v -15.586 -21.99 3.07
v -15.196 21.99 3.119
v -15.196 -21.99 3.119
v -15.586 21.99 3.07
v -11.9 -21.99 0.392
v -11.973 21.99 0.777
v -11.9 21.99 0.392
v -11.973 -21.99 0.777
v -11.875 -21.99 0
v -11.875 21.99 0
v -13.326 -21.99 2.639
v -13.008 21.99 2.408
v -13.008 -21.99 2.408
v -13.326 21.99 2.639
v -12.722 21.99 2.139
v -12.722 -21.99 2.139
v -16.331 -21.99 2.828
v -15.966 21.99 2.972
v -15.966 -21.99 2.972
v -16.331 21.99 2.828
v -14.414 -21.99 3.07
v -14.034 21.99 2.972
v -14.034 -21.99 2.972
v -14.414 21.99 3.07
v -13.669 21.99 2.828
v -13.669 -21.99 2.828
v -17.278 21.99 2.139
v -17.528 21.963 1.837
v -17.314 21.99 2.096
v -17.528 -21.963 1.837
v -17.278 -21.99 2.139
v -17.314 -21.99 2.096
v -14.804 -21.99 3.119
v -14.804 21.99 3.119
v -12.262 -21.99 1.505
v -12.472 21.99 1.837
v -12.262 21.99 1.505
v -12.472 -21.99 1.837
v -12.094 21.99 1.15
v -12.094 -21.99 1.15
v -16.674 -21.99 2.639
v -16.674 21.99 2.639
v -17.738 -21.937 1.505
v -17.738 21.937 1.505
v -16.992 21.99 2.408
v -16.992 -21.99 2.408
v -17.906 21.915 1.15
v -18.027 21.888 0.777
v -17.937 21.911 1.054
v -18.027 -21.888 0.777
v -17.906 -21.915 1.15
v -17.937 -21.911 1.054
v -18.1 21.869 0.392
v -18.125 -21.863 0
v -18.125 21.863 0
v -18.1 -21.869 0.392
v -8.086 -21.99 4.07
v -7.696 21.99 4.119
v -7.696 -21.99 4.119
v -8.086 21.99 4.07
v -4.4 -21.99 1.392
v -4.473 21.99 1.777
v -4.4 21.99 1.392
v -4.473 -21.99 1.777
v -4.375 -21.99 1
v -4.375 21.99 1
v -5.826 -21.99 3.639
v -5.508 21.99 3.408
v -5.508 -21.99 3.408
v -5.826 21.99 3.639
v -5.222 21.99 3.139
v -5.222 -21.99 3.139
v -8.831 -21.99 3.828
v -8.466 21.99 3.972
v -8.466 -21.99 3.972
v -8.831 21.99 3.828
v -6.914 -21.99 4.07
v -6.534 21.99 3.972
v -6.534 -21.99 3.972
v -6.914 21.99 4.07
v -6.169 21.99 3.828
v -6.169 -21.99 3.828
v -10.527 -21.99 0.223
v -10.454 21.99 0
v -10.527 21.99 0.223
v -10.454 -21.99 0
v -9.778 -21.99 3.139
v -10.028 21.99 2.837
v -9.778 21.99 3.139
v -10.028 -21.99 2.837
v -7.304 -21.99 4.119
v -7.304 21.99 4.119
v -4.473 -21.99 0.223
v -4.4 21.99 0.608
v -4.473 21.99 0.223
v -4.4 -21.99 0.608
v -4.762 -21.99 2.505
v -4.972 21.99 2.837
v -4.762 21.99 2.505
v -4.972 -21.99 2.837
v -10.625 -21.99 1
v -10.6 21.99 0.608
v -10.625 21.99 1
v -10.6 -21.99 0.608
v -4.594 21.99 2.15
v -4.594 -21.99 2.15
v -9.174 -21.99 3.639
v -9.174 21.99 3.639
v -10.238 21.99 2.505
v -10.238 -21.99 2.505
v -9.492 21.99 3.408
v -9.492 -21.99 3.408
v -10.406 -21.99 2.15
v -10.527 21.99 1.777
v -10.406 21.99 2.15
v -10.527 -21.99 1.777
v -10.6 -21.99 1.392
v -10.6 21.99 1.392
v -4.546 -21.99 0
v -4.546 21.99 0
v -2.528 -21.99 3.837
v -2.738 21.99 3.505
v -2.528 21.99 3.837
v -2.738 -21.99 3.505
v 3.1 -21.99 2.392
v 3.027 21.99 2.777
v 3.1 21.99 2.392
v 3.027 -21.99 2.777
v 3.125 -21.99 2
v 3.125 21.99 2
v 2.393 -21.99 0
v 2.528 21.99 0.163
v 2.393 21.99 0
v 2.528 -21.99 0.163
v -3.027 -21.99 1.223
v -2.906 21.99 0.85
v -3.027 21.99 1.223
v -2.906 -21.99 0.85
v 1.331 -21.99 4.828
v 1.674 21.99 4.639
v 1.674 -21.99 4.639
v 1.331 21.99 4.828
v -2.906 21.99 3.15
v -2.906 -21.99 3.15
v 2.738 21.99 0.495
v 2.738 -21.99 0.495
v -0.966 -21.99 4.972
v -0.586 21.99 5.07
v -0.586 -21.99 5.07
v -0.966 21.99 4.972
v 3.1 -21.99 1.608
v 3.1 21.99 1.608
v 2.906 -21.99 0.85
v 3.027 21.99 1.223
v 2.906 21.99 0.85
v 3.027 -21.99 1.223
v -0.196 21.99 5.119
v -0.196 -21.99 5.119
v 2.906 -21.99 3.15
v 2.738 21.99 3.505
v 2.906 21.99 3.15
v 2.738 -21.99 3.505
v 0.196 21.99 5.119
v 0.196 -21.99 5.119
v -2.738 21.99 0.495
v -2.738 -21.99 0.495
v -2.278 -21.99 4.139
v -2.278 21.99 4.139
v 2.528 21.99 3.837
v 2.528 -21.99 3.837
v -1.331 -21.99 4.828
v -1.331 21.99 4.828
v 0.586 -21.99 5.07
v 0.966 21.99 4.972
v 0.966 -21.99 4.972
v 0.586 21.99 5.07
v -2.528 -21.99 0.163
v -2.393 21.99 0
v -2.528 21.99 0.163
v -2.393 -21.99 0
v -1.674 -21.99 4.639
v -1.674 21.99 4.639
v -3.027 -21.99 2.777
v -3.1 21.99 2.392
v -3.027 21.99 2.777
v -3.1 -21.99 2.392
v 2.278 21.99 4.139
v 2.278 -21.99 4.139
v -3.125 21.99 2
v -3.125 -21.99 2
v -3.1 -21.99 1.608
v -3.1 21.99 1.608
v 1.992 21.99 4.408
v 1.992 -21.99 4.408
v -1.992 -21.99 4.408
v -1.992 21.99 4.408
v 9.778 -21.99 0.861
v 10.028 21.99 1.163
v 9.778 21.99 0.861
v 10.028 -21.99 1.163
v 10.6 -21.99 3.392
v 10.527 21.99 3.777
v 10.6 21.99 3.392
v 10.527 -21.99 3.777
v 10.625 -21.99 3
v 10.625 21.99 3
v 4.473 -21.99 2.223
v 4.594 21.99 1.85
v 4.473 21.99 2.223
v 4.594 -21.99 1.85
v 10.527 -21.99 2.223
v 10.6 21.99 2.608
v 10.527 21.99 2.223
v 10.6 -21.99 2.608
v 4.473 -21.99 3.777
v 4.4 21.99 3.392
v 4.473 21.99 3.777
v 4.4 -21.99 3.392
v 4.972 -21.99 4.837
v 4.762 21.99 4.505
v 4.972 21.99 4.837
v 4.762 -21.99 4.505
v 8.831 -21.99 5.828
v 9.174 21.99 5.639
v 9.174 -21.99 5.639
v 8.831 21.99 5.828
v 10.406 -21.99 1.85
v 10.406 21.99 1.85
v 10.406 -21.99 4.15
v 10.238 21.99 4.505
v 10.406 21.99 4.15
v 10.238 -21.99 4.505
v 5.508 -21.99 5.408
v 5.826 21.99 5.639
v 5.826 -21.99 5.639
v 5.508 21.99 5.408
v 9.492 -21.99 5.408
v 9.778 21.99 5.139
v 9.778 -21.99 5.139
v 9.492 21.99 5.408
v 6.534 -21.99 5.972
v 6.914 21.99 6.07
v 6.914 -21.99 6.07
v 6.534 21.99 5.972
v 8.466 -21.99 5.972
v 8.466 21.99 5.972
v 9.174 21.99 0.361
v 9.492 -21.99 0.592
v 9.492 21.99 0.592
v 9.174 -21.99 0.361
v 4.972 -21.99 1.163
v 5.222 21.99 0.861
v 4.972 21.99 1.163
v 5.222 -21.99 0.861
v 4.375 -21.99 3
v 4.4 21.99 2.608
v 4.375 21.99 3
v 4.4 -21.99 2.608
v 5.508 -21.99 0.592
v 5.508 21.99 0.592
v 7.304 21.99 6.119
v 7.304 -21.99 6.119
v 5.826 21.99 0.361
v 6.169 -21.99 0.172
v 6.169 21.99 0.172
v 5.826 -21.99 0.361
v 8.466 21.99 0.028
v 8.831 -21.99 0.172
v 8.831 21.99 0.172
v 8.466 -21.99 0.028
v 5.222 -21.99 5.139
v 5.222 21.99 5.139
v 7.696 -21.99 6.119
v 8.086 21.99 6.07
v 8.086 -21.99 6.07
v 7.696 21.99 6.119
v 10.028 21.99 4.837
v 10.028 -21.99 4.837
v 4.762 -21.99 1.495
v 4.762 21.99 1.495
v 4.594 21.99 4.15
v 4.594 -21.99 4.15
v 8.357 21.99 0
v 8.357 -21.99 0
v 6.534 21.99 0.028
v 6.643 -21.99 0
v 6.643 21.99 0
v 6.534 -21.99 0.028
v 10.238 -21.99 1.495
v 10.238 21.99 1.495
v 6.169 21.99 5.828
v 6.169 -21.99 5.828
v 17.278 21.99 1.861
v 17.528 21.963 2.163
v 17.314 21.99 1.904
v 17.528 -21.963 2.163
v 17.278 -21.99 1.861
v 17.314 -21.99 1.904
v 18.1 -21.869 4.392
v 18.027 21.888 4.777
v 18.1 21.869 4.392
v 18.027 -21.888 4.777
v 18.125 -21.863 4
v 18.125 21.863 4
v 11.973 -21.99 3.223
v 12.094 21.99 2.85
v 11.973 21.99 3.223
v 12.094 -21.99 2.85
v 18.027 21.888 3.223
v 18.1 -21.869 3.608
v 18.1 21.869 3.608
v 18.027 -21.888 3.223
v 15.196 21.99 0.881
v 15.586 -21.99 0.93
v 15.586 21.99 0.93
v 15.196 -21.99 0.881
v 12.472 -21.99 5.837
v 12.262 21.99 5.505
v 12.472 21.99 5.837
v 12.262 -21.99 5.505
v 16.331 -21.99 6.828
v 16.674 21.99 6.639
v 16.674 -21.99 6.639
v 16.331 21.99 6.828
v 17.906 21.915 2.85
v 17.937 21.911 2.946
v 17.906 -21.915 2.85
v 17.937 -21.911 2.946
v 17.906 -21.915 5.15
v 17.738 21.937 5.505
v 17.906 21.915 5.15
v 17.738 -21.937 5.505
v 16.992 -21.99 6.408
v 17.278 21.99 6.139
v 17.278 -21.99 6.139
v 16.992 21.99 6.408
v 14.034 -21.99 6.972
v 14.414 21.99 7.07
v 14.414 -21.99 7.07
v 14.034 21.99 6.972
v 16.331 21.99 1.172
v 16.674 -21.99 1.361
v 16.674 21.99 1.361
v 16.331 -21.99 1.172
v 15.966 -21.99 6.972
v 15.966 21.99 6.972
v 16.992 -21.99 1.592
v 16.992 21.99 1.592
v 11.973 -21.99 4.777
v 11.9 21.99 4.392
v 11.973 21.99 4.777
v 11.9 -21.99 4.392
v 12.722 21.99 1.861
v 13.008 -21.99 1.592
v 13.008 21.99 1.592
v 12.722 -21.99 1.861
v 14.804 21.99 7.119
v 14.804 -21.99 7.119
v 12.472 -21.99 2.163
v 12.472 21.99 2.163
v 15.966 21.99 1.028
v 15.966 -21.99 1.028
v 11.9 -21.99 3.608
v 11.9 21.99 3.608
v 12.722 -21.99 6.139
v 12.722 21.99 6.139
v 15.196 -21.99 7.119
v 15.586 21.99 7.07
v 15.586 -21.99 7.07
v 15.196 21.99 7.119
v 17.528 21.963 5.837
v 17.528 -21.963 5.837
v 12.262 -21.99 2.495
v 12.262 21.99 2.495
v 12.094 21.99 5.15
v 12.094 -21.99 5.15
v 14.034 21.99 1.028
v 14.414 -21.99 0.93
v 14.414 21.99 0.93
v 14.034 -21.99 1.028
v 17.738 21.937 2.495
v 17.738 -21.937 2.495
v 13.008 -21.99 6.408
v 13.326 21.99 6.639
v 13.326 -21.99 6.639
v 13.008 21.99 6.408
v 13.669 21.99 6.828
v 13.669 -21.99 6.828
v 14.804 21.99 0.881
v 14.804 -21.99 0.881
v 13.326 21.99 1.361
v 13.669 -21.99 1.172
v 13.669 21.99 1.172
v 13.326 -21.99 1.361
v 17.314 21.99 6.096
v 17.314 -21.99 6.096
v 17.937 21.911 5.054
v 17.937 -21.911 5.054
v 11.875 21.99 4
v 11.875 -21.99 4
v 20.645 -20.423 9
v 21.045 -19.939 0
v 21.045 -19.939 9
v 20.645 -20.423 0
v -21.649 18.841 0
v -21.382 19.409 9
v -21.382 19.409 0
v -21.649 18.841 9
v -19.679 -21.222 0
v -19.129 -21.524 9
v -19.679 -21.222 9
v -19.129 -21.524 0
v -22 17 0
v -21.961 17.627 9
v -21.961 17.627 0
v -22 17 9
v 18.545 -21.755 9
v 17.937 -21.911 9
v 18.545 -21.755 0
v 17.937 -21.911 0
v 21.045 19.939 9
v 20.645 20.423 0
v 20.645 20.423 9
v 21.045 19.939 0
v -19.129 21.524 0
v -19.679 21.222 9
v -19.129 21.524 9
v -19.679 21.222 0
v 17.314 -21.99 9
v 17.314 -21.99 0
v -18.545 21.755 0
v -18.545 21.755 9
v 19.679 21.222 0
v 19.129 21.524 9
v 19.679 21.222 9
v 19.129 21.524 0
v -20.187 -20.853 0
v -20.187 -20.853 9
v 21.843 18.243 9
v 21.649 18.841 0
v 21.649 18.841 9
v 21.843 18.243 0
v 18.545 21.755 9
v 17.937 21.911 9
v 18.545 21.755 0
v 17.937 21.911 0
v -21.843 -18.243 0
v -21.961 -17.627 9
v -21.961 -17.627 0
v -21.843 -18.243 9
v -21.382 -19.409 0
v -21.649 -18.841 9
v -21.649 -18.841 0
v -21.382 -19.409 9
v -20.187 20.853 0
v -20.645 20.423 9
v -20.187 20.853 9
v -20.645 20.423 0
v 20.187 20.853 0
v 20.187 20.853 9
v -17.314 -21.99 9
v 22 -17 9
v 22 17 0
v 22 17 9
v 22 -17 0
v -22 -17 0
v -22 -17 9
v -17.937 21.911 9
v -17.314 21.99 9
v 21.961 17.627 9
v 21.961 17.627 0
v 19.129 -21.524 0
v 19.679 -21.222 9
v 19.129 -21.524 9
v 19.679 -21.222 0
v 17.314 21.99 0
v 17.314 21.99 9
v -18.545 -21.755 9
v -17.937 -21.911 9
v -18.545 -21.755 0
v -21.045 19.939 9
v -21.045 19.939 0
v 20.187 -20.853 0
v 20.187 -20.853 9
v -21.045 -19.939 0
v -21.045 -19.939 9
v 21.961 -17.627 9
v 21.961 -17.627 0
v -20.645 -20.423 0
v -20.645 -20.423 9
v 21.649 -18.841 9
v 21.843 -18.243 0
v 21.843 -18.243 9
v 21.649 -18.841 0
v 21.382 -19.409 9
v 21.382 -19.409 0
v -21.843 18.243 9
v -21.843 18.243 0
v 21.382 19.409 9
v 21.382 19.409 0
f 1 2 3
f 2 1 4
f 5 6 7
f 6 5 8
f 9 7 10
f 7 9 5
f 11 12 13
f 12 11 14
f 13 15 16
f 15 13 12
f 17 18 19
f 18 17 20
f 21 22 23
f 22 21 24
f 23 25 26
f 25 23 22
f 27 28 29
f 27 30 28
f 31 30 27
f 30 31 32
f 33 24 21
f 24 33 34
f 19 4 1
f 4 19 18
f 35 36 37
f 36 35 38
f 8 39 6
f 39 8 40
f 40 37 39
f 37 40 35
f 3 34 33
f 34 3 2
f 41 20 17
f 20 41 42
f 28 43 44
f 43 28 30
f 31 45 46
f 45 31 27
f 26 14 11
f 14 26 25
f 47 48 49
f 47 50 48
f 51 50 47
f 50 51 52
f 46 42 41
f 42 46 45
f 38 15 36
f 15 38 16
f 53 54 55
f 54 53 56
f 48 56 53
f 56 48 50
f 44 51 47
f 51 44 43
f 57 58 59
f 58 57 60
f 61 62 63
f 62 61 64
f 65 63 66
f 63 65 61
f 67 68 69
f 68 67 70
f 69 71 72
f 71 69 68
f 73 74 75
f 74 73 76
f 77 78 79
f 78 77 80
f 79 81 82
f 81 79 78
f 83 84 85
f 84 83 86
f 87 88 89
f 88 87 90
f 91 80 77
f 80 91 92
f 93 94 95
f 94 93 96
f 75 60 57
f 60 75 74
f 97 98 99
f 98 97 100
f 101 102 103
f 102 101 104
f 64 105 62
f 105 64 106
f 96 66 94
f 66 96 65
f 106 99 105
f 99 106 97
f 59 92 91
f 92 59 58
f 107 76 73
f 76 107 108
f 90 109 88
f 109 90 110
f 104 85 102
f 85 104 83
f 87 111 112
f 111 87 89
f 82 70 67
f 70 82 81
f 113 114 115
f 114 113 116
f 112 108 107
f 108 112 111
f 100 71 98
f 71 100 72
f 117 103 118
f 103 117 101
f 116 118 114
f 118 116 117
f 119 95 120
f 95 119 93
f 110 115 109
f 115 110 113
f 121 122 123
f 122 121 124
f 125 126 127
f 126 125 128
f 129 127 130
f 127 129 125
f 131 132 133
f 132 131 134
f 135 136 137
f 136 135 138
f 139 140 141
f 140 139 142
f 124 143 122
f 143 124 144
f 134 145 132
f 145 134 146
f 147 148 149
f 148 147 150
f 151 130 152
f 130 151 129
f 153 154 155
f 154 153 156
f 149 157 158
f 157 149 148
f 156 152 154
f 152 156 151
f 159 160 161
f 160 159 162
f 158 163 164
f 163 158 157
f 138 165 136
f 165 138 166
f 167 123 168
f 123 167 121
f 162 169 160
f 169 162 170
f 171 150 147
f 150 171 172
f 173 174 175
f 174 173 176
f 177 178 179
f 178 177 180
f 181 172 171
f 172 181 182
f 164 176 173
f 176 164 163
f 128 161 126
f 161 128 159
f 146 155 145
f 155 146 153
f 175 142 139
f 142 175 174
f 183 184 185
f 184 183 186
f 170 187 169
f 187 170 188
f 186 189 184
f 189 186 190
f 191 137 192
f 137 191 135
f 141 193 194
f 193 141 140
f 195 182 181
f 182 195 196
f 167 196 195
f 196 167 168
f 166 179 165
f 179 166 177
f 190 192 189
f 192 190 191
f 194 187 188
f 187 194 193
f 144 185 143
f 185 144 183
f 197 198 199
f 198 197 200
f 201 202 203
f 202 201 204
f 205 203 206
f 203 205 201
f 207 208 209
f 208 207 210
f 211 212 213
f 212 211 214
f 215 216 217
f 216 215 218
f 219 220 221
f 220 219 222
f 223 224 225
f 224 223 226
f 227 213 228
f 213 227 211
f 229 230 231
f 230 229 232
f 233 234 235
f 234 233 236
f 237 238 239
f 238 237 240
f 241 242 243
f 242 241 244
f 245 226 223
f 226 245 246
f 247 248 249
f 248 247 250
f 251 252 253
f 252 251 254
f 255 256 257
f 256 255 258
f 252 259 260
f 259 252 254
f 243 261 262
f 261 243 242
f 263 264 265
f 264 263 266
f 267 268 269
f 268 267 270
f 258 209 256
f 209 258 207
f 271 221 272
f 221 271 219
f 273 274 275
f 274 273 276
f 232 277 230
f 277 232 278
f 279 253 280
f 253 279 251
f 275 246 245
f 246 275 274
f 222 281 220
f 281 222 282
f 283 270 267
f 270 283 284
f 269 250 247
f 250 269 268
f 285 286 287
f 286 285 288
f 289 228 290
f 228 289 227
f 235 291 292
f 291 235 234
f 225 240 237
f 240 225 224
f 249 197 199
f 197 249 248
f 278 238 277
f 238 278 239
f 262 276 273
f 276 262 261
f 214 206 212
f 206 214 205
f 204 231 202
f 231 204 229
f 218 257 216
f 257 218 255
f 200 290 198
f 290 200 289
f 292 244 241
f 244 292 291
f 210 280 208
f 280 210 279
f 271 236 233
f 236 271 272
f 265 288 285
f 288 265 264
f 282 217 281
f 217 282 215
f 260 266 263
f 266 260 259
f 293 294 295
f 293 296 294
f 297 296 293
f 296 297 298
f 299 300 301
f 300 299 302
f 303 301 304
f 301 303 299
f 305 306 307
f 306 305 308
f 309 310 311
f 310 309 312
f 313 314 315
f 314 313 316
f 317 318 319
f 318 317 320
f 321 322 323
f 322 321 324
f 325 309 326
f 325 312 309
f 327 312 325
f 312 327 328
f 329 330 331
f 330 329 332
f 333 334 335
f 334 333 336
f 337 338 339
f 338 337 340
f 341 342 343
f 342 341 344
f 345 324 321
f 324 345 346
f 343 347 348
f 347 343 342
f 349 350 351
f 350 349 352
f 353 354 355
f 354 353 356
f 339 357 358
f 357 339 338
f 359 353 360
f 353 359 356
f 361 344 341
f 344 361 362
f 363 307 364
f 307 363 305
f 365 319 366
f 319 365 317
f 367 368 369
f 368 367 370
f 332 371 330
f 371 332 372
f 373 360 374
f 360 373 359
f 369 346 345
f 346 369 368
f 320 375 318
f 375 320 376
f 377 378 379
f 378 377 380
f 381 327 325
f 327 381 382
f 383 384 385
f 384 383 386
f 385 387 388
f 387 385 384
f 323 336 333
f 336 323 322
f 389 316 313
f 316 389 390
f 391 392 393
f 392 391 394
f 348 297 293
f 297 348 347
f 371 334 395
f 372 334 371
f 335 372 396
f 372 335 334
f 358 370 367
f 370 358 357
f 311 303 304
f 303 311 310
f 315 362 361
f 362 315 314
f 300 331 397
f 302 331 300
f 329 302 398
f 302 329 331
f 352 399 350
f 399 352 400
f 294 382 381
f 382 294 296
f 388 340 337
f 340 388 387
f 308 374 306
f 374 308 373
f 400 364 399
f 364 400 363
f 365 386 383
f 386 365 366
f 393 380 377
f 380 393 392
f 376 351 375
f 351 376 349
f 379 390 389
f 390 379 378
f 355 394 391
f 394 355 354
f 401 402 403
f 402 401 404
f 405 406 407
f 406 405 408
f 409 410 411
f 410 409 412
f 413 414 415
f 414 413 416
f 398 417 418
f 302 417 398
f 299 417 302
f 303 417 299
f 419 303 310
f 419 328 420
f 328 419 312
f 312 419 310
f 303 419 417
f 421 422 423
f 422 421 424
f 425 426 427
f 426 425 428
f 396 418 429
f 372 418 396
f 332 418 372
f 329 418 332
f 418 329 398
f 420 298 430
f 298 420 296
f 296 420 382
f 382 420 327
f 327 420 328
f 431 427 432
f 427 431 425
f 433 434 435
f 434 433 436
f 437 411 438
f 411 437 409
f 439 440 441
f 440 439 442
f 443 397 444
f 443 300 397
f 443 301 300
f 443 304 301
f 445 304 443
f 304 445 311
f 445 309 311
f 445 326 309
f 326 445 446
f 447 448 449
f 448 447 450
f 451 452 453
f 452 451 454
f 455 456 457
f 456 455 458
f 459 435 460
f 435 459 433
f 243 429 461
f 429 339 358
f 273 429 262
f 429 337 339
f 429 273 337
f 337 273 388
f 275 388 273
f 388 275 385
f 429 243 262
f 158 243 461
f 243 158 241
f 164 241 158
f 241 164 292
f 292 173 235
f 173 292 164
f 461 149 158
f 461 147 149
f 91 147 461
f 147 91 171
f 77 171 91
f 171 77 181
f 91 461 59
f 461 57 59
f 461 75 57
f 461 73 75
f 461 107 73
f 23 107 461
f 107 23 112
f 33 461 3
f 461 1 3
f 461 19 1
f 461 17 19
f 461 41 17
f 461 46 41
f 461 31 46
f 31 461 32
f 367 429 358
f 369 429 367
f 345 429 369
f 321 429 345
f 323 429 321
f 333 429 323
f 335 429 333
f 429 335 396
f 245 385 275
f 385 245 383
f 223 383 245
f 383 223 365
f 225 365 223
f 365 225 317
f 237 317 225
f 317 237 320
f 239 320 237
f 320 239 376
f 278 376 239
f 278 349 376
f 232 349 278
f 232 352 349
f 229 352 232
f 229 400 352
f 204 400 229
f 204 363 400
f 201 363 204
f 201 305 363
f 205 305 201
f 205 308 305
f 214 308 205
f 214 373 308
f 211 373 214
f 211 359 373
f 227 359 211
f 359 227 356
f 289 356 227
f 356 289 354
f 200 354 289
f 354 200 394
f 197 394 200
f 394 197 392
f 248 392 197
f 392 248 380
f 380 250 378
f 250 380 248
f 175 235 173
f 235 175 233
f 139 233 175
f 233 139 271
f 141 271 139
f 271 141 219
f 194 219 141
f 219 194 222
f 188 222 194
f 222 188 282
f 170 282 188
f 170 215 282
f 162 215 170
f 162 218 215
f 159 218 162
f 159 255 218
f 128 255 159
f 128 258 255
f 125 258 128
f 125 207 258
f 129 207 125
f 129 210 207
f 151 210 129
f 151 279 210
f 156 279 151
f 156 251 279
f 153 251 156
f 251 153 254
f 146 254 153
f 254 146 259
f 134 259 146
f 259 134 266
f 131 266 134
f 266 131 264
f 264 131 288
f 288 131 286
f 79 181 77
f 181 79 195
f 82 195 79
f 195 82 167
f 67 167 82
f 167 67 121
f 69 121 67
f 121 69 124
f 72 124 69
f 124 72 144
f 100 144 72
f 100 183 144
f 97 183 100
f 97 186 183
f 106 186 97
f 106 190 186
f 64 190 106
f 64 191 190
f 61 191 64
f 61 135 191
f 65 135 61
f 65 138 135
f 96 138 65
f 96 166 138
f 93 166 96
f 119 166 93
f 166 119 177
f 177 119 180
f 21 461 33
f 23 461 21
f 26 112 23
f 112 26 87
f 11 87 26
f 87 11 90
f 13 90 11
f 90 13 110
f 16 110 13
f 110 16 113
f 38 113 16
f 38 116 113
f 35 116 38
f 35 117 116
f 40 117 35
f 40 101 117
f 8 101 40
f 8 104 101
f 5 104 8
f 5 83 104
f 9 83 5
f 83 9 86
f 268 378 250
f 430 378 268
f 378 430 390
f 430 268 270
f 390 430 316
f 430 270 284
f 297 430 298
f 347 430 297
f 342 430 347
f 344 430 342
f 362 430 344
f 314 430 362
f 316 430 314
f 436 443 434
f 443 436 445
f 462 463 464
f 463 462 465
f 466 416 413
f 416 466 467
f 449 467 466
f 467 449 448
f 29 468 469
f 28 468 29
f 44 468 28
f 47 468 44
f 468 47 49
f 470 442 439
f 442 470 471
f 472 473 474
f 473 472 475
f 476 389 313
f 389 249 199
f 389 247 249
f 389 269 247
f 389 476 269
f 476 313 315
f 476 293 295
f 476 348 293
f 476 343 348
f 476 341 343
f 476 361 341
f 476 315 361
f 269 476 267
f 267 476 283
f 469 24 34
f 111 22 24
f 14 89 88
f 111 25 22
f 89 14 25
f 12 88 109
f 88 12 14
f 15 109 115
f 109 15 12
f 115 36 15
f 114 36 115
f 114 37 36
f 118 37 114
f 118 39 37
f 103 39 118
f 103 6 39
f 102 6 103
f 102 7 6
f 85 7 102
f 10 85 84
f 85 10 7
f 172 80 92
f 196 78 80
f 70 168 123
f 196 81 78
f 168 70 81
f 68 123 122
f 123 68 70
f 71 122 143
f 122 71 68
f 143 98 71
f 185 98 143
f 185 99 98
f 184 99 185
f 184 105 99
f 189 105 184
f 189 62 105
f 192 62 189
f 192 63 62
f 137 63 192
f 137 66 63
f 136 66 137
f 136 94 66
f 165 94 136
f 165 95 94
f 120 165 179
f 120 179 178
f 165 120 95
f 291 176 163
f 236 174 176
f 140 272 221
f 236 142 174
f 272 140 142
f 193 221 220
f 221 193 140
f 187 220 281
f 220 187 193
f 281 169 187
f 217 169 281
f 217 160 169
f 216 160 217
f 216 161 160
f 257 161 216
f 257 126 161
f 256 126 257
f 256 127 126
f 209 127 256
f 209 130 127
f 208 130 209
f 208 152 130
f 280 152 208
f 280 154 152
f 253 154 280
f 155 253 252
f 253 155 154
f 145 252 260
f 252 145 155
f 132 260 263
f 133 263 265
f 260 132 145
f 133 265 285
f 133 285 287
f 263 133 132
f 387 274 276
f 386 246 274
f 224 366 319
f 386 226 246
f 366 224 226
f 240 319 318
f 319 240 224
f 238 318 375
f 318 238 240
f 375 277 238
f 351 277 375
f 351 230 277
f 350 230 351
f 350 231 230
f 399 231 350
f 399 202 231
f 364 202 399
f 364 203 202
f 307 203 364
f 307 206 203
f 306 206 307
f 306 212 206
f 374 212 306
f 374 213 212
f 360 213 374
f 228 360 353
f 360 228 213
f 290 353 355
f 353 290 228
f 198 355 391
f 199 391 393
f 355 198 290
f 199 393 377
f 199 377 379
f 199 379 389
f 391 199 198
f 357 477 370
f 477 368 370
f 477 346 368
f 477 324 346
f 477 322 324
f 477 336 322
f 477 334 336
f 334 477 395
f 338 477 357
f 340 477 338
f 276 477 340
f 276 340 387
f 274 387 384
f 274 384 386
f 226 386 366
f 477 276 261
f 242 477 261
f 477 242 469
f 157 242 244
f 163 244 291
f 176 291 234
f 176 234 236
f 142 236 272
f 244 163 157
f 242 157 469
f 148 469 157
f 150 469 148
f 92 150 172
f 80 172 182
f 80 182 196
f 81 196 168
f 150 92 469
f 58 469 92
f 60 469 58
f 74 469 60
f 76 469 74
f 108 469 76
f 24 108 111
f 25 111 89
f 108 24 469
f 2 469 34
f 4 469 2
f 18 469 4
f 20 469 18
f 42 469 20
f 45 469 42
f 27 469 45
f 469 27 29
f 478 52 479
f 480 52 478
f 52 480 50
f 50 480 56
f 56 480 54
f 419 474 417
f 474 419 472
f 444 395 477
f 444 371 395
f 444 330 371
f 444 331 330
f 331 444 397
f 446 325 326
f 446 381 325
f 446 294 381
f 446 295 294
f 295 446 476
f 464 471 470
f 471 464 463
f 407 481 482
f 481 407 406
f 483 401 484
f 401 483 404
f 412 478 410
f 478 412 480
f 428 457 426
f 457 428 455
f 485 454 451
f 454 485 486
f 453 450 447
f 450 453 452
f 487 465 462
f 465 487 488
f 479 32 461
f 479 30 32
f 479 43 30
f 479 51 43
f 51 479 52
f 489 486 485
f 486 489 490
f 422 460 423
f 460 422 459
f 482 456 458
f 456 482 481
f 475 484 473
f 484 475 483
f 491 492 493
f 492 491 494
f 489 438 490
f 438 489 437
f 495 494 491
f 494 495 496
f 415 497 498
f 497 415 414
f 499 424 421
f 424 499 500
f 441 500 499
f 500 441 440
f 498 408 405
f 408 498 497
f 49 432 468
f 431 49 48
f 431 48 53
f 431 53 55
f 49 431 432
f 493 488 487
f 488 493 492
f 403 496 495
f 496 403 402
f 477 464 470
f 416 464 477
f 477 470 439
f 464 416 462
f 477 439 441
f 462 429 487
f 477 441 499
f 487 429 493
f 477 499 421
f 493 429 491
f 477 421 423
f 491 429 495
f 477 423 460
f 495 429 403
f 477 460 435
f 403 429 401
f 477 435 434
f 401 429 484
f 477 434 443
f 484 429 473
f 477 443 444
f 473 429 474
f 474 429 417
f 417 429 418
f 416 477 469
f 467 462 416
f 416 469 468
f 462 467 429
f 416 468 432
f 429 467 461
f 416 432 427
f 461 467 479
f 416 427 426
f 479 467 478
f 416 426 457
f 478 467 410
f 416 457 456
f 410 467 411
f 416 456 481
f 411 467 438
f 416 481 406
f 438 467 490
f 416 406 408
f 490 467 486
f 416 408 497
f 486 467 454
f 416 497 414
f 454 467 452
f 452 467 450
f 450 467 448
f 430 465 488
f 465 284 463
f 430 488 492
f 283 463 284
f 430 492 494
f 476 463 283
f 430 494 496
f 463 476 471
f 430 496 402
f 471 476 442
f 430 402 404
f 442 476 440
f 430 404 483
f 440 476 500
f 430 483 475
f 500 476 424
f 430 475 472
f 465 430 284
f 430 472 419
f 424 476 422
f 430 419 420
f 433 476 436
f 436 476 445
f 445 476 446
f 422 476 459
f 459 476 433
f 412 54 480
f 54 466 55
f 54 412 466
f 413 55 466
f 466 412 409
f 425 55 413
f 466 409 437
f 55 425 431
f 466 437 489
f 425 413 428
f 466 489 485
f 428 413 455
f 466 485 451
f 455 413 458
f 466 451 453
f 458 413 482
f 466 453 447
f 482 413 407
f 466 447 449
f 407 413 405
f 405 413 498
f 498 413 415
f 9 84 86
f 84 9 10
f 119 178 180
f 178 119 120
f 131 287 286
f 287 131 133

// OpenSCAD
$fn = 50;


difference() {
	union() {
		hull() {
			translate(v = [-17.0000000000, 17.0000000000, 0]) {
				cylinder(h = 9, r = 5);
			}
			translate(v = [17.0000000000, 17.0000000000, 0]) {
				cylinder(h = 9, r = 5);
			}
			translate(v = [-17.0000000000, -17.0000000000, 0]) {
				cylinder(h = 9, r = 5);
			}
			translate(v = [17.0000000000, -17.0000000000, 0]) {
				cylinder(h = 9, r = 5);
			}
		}
	}
	union() {
		#translate(v = [-15.0000000000, 22.5000000000, 0.0000000000]) {
			rotate(a = [90, 0, 0]) {
				cylinder(h = 45, r = 3.1250000000);
			}
		}
		#translate(v = [-7.5000000000, 22.5000000000, 1.0000000000]) {
			rotate(a = [90, 0, 0]) {
				cylinder(h = 45, r = 3.1250000000);
			}
		}
		#translate(v = [0.0000000000, 22.5000000000, 2.0000000000]) {
			rotate(a = [90, 0, 0]) {
				cylinder(h = 45, r = 3.1250000000);
			}
		}
		#translate(v = [7.5000000000, 22.5000000000, 3.0000000000]) {
			rotate(a = [90, 0, 0]) {
				cylinder(h = 45, r = 3.1250000000);
			}
		}
		#translate(v = [15.0000000000, 22.5000000000, 4.0000000000]) {
			rotate(a = [90, 0, 0]) {
				cylinder(h = 45, r = 3.1250000000);
			}
		}
	}
}
